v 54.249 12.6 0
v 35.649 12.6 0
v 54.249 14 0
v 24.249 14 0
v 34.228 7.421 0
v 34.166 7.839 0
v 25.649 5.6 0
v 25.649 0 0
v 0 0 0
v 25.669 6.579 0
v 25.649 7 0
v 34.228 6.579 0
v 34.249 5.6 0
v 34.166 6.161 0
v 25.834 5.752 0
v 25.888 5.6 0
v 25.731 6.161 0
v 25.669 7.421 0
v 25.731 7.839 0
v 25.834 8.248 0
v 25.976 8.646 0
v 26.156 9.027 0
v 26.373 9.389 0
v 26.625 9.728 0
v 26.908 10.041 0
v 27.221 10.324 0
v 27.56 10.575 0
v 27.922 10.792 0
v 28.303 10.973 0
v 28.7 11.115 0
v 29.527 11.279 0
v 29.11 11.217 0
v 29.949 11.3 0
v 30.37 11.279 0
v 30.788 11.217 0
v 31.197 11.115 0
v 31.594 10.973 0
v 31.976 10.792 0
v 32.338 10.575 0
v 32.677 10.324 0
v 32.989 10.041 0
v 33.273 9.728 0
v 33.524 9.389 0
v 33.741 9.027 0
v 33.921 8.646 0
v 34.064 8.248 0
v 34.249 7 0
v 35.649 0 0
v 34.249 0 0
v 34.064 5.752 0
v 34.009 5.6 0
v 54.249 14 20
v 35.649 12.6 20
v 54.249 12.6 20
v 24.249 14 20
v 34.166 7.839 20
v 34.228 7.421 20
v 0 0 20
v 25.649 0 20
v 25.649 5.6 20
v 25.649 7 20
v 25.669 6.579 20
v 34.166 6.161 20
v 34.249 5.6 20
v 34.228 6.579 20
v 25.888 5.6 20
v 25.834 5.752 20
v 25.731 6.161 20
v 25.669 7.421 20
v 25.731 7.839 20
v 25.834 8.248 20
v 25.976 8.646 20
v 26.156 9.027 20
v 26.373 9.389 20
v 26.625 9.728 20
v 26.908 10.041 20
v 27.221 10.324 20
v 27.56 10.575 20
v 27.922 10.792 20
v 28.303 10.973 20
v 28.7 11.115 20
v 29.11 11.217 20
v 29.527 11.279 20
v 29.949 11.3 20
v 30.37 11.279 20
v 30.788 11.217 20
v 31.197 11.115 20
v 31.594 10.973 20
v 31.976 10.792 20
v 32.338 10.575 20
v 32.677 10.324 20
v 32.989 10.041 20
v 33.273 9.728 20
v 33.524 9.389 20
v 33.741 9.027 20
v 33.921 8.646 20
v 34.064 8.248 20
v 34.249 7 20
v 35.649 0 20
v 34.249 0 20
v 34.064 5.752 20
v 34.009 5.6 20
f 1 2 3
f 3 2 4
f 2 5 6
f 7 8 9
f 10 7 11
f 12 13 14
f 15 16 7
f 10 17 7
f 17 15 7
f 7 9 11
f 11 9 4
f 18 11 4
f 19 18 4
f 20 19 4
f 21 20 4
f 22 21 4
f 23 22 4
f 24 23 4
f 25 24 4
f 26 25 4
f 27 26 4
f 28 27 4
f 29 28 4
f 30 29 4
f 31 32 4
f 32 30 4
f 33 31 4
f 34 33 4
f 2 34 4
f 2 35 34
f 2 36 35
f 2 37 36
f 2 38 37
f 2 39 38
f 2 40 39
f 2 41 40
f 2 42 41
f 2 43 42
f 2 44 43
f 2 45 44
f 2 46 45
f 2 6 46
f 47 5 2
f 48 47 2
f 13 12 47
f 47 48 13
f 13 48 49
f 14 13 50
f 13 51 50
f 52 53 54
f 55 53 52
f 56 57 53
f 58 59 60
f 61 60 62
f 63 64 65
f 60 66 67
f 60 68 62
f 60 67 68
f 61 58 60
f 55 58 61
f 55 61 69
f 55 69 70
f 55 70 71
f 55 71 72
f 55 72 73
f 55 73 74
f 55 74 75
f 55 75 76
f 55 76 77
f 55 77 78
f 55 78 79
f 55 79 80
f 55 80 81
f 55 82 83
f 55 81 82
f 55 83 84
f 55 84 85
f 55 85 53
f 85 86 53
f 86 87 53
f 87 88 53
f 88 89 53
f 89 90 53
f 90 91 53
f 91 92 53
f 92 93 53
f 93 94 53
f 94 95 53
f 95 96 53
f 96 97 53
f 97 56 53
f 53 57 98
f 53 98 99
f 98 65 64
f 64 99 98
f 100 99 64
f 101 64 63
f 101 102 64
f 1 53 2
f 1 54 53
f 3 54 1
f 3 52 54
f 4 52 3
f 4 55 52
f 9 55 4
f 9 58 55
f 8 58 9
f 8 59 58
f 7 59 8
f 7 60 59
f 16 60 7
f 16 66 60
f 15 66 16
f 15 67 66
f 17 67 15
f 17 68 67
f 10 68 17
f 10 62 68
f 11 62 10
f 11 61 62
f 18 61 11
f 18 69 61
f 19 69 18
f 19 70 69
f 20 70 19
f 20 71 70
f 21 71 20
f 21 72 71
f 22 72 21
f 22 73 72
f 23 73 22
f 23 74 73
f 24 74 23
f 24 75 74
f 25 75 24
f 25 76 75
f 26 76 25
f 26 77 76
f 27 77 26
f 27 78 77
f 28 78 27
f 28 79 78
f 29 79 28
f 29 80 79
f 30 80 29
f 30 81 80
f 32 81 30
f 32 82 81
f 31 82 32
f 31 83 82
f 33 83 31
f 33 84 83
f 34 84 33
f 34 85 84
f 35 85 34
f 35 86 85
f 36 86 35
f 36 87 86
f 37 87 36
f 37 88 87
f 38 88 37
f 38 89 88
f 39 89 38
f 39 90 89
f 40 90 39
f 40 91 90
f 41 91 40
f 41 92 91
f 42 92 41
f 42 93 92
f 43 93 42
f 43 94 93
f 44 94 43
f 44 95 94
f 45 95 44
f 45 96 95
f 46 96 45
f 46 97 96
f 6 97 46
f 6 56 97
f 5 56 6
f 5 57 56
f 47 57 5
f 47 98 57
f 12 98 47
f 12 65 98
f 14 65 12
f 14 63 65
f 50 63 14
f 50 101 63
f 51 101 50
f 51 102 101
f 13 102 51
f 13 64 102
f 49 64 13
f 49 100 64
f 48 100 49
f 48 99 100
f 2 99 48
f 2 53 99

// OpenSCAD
$fn = $preview ? 16 : 64;

// height of profile
height = 14;

angle = 30;

width_1 = 10;

width_2 = 20;
// width of walls
width_wall = 1.4;
// length of profile
length = 20;

module __hidden__ () {}

width_0 = height / tan(angle);
width_0_1 = width_0 + width_1;
width_0_2 = width_0_1 + width_2;

eps = 0.1;
eps2 = 0.2;

points = [
     [0,0]              // 0
    ,[width_0,0]        // 1
    ,[width_0_1,0]      // 2
    ,[width_0_2,0]      // 3
    ,[width_0_2,height] // 4
    ,[width_0_1,height] // 5
    ,[width_0,height]   // 6
];

module profile_base() {
    difference() {
        polygon(points);
        
        translate([width_0_1 + width_wall, -width_wall])
            square([width_2, height]);
        
        translate([width_0 + width_wall, -width_wall])
            square([width_1 - width_wall, height / 2 ]);    
        
        translate([width_0 + width_1 / 2 + width_wall / 2, height / 2])
            circle(d = width_1 - width_wall);
            //square([width_1 - width_wall, height / 2 ]);            
    }
}

linear_extrude(length)
    profile_base();
